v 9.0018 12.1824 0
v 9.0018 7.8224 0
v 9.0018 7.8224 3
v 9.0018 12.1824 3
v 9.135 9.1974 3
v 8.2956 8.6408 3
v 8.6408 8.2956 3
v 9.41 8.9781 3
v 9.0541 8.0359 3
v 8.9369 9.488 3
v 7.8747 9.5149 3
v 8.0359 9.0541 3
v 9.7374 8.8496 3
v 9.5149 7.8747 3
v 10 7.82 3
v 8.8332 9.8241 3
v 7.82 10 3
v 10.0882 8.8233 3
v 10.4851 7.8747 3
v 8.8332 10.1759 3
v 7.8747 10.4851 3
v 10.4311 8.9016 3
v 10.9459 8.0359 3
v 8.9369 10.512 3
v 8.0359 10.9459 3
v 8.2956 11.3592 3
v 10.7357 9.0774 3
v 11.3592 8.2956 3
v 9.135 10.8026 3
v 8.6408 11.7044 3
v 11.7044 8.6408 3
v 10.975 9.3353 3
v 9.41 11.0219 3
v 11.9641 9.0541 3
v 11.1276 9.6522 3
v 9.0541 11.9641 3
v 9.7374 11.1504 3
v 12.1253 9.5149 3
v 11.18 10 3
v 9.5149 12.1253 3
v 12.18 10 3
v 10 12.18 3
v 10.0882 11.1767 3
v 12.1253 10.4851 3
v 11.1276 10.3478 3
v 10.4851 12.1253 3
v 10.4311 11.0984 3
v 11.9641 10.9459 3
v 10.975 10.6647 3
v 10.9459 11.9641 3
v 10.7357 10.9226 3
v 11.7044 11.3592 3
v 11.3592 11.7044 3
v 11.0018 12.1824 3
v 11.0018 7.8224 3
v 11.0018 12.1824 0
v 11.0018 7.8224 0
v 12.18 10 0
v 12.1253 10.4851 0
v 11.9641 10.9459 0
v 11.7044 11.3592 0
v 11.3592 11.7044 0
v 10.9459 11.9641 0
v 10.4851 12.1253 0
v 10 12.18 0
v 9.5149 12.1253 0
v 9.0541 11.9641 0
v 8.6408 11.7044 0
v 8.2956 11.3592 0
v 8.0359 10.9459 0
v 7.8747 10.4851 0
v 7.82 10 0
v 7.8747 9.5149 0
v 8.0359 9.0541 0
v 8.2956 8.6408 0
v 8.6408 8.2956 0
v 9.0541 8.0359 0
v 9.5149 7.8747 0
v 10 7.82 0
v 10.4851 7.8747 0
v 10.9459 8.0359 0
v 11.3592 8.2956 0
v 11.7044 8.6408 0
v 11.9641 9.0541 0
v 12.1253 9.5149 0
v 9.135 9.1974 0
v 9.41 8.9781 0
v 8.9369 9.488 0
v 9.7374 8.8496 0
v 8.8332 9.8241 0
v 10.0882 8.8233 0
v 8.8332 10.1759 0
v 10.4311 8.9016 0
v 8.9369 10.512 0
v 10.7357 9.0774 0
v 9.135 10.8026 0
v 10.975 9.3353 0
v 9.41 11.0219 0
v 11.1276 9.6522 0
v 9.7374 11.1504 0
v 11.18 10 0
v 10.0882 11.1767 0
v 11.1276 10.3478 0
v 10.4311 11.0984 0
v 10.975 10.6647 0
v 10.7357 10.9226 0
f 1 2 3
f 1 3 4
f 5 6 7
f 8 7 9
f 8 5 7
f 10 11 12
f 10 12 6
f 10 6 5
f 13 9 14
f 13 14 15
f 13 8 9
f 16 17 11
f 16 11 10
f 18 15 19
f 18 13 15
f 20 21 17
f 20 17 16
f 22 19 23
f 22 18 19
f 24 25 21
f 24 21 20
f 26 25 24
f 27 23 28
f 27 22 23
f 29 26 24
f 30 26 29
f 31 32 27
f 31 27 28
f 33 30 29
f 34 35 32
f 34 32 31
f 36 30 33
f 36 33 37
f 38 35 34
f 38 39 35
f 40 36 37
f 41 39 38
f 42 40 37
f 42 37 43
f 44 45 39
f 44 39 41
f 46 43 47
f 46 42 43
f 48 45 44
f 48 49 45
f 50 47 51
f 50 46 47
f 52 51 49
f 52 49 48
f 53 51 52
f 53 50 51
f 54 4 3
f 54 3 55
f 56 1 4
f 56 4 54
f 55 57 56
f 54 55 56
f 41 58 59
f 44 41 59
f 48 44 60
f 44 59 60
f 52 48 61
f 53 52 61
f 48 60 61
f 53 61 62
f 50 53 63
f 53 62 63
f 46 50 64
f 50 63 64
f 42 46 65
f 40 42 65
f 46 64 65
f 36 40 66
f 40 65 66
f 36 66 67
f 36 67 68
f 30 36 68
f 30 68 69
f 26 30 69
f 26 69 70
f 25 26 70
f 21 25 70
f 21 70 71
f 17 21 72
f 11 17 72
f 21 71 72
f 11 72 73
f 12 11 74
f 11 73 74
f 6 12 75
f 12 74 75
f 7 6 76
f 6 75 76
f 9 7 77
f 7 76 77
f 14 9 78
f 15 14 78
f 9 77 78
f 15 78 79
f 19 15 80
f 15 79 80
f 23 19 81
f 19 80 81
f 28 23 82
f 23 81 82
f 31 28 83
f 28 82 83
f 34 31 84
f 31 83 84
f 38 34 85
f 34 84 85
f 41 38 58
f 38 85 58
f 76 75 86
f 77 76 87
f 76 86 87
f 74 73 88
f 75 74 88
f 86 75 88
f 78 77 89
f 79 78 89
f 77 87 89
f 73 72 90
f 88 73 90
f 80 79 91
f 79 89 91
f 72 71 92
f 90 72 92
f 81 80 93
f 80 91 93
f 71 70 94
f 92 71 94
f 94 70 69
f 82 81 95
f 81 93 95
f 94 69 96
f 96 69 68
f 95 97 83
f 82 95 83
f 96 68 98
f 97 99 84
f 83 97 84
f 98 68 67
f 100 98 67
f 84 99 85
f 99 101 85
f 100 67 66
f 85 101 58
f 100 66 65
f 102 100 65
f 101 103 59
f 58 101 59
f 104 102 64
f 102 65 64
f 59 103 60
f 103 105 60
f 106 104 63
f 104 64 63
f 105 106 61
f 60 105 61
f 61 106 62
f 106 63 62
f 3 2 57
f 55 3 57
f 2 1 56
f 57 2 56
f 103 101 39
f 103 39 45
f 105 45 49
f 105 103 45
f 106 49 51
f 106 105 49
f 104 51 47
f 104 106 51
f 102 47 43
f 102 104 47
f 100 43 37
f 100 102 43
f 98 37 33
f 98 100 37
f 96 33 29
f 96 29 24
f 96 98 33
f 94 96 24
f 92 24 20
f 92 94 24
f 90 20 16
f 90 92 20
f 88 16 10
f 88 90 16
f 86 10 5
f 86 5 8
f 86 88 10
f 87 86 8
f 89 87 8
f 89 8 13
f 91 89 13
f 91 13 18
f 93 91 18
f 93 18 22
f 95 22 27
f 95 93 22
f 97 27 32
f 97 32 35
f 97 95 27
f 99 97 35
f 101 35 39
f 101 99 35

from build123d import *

# Parameters (mm, degrees)
SKETCH_R     = 2.18
SKETCH_R_2   = 1.18
PAD_DEPTH    = 3
SKETCH001_W  = 2
SKETCH001_H  = 4.36
PAD001_DEPTH = 3


with BuildPart() as body:
    # Sketch → Pad (new body)
    with BuildSketch(Plane.XY):
        with Locations((10, 10)):
            Circle(SKETCH_R)
        with Locations((10, 10)):
            Circle(SKETCH_R_2, mode=Mode.SUBTRACT)
    extrude(amount=PAD_DEPTH)


with BuildPart() as body001:
    # Sketch001 → Pad001 (new body)
    with BuildSketch(Plane.XY):
        with Locations((10.001777, 10.002387)):
            Rectangle(SKETCH001_W, SKETCH001_H)
    extrude(amount=PAD001_DEPTH)


solid = Compound([body.part, body001.part])
